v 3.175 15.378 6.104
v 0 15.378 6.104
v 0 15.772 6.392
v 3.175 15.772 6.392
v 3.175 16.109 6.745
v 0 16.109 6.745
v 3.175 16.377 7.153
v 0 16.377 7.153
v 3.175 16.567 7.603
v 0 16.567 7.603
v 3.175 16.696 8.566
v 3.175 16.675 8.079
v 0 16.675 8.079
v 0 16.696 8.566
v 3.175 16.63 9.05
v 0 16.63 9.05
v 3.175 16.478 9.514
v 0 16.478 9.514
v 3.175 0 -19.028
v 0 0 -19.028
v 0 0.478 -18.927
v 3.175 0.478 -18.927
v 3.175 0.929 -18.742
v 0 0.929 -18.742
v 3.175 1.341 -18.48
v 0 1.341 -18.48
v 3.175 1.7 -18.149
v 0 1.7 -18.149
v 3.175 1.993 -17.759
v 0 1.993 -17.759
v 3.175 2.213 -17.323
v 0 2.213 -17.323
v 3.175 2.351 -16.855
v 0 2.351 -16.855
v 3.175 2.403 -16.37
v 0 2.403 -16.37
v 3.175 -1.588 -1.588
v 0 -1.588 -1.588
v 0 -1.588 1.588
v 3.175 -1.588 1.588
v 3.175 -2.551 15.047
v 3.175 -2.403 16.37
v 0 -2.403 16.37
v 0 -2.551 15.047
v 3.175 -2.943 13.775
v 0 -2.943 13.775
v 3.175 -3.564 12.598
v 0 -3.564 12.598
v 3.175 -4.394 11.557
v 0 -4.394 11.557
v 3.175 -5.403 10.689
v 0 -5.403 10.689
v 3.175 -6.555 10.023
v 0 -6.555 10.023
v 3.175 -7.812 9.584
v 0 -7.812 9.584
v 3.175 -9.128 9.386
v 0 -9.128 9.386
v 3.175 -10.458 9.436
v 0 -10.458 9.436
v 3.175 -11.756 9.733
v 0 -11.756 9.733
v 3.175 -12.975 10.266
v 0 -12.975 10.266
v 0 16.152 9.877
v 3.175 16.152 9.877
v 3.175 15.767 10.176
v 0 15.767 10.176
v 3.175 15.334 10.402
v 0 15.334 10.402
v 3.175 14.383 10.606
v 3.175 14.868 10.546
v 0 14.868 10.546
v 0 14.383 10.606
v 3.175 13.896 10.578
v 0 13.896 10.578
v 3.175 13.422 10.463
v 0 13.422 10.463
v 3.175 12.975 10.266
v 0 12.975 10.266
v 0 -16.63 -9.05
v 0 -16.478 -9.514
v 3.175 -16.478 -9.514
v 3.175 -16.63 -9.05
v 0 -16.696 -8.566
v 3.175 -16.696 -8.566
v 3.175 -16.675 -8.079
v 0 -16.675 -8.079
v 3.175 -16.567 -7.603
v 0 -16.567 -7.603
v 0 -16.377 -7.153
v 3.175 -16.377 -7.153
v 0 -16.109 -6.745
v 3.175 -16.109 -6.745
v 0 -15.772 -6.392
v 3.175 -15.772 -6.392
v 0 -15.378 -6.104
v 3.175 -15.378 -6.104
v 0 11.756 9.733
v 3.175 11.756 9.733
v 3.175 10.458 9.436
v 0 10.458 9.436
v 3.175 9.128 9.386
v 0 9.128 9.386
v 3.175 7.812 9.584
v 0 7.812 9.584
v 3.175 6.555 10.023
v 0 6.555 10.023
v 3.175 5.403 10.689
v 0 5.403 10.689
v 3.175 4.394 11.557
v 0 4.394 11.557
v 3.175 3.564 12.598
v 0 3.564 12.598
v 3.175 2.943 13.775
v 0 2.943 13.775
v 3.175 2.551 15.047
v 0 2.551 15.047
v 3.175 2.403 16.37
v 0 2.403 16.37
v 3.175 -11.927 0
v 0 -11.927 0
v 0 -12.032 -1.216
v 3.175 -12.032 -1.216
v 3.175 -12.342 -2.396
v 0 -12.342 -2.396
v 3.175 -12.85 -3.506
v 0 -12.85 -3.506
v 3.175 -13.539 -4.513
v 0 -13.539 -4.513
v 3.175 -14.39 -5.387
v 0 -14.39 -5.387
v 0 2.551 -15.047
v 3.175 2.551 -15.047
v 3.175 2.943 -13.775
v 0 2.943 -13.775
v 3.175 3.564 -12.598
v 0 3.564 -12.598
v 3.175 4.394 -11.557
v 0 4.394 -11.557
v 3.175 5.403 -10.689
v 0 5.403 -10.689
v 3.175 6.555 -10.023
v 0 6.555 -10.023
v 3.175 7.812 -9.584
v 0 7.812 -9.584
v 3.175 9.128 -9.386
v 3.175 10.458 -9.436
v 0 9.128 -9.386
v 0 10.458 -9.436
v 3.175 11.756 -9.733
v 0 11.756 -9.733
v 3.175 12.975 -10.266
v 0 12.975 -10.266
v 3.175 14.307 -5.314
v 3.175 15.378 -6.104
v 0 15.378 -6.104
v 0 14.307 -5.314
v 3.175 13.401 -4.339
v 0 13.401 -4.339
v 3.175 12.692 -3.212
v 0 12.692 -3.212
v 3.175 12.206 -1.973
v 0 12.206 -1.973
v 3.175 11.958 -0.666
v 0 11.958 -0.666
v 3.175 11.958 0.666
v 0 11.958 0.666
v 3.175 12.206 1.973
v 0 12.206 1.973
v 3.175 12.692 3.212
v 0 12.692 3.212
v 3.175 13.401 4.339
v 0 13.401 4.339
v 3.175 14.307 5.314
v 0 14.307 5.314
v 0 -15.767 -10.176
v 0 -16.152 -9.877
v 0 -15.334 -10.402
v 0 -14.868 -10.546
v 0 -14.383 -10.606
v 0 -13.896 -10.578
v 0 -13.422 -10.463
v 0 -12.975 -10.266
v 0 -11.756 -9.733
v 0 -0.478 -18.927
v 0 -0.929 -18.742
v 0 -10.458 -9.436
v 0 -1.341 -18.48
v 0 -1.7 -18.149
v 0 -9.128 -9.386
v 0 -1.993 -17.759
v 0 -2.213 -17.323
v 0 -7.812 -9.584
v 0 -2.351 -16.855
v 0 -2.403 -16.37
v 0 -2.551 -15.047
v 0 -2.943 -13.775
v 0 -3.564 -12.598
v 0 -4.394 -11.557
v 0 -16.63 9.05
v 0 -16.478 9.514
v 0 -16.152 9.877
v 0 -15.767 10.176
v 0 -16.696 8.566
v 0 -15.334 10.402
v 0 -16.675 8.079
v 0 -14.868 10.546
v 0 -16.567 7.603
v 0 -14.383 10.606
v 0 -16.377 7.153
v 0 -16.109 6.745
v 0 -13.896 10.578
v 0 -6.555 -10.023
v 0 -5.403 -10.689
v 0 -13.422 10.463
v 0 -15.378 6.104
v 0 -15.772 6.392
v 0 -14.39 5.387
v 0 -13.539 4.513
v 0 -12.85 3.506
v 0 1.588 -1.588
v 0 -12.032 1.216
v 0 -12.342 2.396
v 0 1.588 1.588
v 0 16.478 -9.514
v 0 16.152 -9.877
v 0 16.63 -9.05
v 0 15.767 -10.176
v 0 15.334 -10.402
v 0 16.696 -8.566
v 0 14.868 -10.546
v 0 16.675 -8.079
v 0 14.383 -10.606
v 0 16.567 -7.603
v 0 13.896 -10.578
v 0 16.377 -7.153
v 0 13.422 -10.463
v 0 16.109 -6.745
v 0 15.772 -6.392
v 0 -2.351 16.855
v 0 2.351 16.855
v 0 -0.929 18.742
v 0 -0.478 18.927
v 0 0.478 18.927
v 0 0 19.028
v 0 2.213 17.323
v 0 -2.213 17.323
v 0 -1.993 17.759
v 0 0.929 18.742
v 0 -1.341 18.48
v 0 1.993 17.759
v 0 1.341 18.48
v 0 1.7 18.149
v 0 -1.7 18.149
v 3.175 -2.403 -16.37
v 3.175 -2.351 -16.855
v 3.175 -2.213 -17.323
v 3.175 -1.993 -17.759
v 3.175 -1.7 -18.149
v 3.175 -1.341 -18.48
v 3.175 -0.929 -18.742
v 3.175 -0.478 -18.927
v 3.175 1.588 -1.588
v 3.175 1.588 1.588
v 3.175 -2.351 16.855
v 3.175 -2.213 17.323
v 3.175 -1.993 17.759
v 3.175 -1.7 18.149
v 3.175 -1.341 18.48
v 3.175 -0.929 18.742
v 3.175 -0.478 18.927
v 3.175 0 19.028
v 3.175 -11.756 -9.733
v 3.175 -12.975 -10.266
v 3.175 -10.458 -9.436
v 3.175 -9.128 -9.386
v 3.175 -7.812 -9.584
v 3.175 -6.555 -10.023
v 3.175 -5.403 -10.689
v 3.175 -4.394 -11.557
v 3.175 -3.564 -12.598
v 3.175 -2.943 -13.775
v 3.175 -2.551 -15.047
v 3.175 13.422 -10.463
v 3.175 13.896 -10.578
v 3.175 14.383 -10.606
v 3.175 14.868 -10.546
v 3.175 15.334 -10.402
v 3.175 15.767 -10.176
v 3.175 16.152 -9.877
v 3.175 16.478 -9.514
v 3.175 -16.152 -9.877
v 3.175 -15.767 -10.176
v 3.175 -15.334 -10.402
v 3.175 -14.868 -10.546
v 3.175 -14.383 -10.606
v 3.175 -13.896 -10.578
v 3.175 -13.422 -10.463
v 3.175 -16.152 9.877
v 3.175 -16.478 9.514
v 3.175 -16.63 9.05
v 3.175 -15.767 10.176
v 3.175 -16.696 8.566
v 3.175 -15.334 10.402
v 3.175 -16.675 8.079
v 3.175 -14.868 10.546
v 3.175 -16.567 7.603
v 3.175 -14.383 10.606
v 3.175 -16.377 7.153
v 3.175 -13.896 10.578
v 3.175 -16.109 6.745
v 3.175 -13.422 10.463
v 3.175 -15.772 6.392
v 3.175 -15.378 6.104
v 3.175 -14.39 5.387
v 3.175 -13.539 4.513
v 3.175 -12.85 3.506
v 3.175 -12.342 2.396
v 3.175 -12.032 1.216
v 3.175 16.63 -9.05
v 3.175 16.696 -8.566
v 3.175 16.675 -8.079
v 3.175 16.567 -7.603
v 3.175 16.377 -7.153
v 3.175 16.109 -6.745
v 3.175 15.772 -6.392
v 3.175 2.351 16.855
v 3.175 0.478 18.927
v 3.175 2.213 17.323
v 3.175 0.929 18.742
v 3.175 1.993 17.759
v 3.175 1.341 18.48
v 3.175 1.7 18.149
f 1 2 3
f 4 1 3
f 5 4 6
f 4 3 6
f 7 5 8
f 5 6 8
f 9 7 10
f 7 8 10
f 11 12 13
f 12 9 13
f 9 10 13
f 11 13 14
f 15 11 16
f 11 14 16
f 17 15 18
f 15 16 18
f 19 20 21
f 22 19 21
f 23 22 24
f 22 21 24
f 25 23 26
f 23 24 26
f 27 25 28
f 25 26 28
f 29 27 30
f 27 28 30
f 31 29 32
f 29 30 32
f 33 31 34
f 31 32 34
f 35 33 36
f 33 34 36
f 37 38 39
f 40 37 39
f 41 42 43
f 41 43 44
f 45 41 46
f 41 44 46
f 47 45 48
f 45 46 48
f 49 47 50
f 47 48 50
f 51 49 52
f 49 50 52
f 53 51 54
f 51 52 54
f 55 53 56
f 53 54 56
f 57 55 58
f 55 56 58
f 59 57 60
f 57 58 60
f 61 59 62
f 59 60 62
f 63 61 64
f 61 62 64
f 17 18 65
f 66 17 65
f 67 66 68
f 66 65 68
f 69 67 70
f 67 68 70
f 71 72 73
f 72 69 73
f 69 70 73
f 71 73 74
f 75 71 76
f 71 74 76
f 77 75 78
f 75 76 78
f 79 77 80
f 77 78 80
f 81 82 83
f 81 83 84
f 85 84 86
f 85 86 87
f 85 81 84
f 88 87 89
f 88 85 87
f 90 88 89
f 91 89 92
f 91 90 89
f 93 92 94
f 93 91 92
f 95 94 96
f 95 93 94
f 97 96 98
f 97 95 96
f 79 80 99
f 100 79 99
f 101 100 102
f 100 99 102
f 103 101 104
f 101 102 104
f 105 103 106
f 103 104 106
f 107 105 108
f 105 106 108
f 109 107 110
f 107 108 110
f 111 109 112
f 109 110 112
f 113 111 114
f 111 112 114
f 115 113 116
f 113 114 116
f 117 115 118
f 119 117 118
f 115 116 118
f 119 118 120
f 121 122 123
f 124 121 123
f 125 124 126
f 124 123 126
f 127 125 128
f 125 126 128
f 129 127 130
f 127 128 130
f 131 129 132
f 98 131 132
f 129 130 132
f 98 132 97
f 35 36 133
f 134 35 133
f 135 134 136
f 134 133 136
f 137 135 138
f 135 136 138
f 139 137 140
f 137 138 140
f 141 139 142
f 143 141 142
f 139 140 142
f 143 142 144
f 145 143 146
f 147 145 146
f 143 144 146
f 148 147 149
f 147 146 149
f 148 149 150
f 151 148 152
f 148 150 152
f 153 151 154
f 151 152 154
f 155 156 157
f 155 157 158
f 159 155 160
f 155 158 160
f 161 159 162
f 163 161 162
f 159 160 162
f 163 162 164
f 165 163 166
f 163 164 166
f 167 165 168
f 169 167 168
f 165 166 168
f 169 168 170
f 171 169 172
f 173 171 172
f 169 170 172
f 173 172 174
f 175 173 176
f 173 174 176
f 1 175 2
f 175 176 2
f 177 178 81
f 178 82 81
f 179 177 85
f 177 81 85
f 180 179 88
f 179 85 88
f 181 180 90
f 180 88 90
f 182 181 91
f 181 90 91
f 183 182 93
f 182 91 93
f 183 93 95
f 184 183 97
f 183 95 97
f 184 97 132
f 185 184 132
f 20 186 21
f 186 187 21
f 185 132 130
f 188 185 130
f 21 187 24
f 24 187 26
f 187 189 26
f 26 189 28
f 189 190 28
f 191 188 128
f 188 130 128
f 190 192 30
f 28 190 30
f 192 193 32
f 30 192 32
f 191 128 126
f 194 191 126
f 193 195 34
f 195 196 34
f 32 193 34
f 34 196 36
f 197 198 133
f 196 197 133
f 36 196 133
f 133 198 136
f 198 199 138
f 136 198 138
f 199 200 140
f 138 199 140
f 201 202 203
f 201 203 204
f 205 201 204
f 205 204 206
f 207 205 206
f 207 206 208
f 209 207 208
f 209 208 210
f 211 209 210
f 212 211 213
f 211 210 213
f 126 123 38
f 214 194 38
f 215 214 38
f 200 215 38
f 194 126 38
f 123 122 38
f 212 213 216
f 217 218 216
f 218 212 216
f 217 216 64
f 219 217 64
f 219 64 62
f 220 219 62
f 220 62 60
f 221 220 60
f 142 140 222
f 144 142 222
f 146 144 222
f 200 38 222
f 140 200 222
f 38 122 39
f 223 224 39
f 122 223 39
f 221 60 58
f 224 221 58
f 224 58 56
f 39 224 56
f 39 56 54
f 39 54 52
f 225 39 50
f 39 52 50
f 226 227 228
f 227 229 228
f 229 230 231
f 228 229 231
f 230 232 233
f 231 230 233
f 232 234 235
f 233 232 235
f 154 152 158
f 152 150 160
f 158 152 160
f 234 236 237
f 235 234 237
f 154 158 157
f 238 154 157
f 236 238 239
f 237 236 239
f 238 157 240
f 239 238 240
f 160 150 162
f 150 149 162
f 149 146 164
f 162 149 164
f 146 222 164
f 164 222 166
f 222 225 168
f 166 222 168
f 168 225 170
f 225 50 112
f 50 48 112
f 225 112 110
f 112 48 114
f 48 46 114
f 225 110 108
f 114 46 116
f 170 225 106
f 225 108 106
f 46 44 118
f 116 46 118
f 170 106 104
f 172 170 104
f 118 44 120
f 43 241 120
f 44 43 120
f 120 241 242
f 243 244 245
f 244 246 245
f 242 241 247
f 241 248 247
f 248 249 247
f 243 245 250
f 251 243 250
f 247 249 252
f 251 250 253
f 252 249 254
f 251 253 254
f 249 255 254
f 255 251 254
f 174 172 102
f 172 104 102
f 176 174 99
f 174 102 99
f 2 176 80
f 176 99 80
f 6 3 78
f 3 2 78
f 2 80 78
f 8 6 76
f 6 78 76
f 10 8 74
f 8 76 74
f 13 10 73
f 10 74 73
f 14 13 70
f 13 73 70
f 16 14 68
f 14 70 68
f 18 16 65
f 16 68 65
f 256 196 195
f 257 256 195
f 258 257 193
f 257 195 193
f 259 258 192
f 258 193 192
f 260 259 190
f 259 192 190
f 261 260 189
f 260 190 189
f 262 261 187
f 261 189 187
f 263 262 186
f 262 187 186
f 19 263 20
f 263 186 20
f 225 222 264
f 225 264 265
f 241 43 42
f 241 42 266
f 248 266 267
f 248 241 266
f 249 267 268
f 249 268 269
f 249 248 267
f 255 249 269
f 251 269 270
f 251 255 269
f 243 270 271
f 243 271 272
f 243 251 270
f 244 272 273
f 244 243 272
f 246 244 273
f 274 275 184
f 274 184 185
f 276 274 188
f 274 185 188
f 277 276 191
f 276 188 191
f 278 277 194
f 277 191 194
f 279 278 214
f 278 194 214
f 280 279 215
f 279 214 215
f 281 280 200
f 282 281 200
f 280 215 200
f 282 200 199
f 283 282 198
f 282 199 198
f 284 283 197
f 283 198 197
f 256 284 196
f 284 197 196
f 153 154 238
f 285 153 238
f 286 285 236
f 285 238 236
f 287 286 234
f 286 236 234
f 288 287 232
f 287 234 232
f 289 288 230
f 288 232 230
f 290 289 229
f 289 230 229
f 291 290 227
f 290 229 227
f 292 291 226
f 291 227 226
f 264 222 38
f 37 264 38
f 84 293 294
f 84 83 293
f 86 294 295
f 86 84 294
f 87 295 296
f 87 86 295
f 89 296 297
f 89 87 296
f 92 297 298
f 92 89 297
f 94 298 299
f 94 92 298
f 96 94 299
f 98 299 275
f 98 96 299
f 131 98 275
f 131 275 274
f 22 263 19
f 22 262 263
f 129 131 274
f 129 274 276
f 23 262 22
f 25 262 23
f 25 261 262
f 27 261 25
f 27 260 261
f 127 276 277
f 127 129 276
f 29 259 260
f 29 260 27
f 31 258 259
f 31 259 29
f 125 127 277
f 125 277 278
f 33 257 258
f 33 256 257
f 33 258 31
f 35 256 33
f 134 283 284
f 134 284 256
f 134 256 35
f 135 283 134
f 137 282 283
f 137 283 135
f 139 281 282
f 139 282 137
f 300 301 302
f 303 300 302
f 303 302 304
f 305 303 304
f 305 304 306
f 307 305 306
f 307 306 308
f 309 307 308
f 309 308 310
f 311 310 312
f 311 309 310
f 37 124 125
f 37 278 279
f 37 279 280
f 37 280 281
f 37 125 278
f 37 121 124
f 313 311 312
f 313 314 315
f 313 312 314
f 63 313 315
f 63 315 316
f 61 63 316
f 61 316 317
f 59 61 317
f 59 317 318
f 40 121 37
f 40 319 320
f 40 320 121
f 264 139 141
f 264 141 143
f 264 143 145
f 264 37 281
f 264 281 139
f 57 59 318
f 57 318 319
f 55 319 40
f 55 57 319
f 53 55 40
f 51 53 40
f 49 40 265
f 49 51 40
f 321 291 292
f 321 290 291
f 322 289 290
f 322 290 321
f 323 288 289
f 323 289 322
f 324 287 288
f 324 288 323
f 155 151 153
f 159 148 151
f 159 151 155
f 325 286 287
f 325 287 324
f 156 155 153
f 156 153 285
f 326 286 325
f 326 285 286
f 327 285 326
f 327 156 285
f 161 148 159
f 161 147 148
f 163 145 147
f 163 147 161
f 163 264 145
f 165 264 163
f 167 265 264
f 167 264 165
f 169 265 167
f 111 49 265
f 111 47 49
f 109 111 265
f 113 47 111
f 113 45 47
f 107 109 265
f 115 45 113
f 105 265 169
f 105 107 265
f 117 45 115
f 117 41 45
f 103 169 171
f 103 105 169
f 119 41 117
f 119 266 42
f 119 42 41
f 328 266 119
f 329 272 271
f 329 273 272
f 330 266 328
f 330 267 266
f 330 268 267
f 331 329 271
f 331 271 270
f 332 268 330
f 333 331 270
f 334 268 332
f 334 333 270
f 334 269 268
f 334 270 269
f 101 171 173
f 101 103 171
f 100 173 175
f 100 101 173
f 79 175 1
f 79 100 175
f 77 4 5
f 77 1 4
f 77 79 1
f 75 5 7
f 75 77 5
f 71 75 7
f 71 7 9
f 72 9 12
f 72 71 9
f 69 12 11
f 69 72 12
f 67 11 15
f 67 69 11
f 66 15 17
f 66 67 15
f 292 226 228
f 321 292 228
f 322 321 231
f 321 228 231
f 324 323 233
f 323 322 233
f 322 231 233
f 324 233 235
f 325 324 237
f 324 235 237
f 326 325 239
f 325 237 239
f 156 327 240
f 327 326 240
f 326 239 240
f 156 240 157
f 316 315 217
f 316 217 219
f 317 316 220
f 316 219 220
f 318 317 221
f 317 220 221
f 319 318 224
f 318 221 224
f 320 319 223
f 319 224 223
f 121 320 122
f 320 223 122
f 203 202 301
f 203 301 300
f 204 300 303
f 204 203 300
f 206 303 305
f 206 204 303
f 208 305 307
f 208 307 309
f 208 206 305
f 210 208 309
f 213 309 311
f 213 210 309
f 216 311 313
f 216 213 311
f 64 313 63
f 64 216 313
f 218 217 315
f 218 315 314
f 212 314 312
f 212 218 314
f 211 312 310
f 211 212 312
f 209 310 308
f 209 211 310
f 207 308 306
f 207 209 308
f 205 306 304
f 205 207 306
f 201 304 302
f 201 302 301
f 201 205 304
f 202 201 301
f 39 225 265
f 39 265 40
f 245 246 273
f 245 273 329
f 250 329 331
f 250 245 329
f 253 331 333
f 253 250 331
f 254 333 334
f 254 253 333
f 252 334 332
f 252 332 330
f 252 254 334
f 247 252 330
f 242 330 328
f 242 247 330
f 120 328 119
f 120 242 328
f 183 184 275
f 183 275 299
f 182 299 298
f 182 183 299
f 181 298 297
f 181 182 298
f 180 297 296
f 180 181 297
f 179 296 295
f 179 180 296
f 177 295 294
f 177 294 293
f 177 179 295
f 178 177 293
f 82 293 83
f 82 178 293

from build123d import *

# Parameters (mm, degrees)
F1_DEPTH    = 3.175
F2_W        = 3.175
F2_H        = 3.175
F3_DEPTH    = 25.4
F4_T1_DEPTH = 19.0841031127


# Not quite as in the source:
# - a fillet or chamfer that OpenCascade refuses, or shapes differently, is made with other operations: its cross-section is extruded or revolved along the edge and cut away or added


with BuildPart() as f1:
    # F0 (on Right) → F1 (new body)
    with BuildSketch(Plane.YZ):
        with BuildLine():
            ThreePointArc((17.7183197491, -6.9974027515), (11.9270078227, 0), (17.7183197491, 6.9974027515))
            ThreePointArc((17.7183197491, 6.9974027515), (16.4977839421, 9.525), (14.9190884179, 11.8458136394))
            ThreePointArc((14.9190884179, 11.8458136394), (5.9635039114, 10.3290917656), (2.7992313312, 18.8432163909))
            ThreePointArc((2.7992313312, 18.8432163909), (0, 19.05), (-2.7992313312, 18.8432163909))
            ThreePointArc((-2.7992313312, 18.8432163909), (-2.5020157635, 17.6871997533), (-2.4020078227, 16.4977839421))
            ThreePointArc((-2.4020078227, 16.4977839421), (-7.0435721899, 9.8209932773), (-14.9190884179, 11.8458136394))
            ThreePointArc((-14.9190884179, 11.8458136394), (-16.4977839421, 9.525), (-17.7183197491, 6.9974027515))
            ThreePointArc((-17.7183197491, 6.9974027515), (-13.5626251464, 4.5415564264), (-11.9270078227, 0))
            ThreePointArc((-11.9270078227, 0), (-13.5626251464, -4.5415564264), (-17.7183197491, -6.9974027515))
            ThreePointArc((-17.7183197491, -6.9974027515), (-16.4977839421, -9.525), (-14.9190884179, -11.8458136394))
            ThreePointArc((-14.9190884179, -11.8458136394), (-7.0435721899, -9.8209932773), (-2.4020078227, -16.4977839421))
            ThreePointArc((-2.4020078227, -16.4977839421), (-2.5020157635, -17.6871997533), (-2.7992313312, -18.8432163909))
            ThreePointArc((-2.7992313312, -18.8432163909), (0, -19.05), (2.7992313312, -18.8432163909))
            ThreePointArc((2.7992313312, -18.8432163909), (5.9635039114, -10.3290917656), (14.9190884179, -11.8458136394))
            ThreePointArc((14.9190884179, -11.8458136394), (16.4977839421, -9.525), (17.7183197491, -6.9974027515))
        make_face()
    extrude(amount=F1_DEPTH)

    # F2 (on face) → F3 (cut)
    with BuildSketch(Plane(origin=(0, 0, 0), x_dir=(0, -1, 0), z_dir=(-1, 0, 0))):
        Rectangle(F2_W, F2_H)
    extrude(amount=-F3_DEPTH, mode=Mode.SUBTRACT)

    # F4: fillet of radius 2.7258813335 on 12 edges, made by hand

    # F4_s2 → F4_t1 (cut)
    with BuildSketch(Plane.YZ.offset(-7.9545515563)):
        with BuildLine():
            ThreePointArc((-16.6826195947, 9.1974291766), (-15.0505041811, 10.5005937812), (-12.9751564545, 10.2661358457))
            ThreePointArc((-12.9751564545, 10.2661358457), (-14.0171055557, 10.9698543809), (-14.9190884179, 11.8458136394))
            ThreePointArc((-14.9190884179, 11.8458136394), (-15.8562439561, 10.5585049892), (-16.6826195947, 9.1974291766))
        make_face()
        with BuildLine():
            ThreePointArc((-15.3783126684, 6.1037471848), (-16.6190330599, 7.78382207), (-16.3065171138, 9.8488577824))
            ThreePointArc((-16.3065171138, 9.8488577824), (-17.0720555246, 8.45265758), (-17.7183197491, 6.9974027515))
            ThreePointArc((-17.7183197491, 6.9974027515), (-16.5087253475, 6.6542423084), (-15.3783126684, 6.1037471848))
        make_face()
        with BuildLine():
            ThreePointArc((-16.3065171138, -9.8488577824), (-16.6190330599, -7.78382207), (-15.3783126684, -6.1037471848))
            ThreePointArc((-15.3783126684, -6.1037471848), (-16.5087253475, -6.6542423084), (-17.7183197491, -6.9974027515))
            ThreePointArc((-17.7183197491, -6.9974027515), (-17.0720555246, -8.45265758), (-16.3065171138, -9.8488577824))
        make_face()
        with BuildLine():
            ThreePointArc((-12.9751564545, -10.2661358457), (-15.0505041811, -10.5005937812), (-16.6826195947, -9.1974291766))
            ThreePointArc((-16.6826195947, -9.1974291766), (-15.8562439561, -10.5585049892), (-14.9190884179, -11.8458136394))
            ThreePointArc((-14.9190884179, -11.8458136394), (-14.0171055557, -10.9698543809), (-12.9751564545, -10.2661358457))
        make_face()
        with BuildLine():
            ThreePointArc((-2.4031562138, -16.3698830306), (-1.5685288788, -18.2844158512), (0.3761024809, -19.046286959))
            ThreePointArc((0.3761024809, -19.046286959), (-1.2158115686, -19.0111625691), (-2.7992313312, -18.8432163909))
            ThreePointArc((-2.7992313312, -18.8432163909), (-2.4916197918, -17.6240966892), (-2.4031562138, -16.3698830306))
        make_face()
        with BuildLine():
            ThreePointArc((-2.4031562138, 16.3698830306), (-1.5685288788, 18.2844158512), (0.3761024809, 19.046286959))
            ThreePointArc((0.3761024809, 19.046286959), (-1.2158115686, 19.0111625691), (-2.7992313312, 18.8432163909))
            ThreePointArc((-2.7992313312, 18.8432163909), (-2.4916197918, 17.6240966892), (-2.4031562138, 16.3698830306))
        make_face()
        with BuildLine():
            ThreePointArc((16.6826195947, 9.1974291766), (15.0505041811, 10.5005937812), (12.9751564545, 10.2661358457))
            ThreePointArc((12.9751564545, 10.2661358457), (14.0171055557, 10.9698543809), (14.9190884179, 11.8458136394))
            ThreePointArc((14.9190884179, 11.8458136394), (15.8562439561, 10.5585049892), (16.6826195947, 9.1974291766))
        make_face()
        with BuildLine():
            ThreePointArc((-0.3761024809, 19.046286959), (1.5685288788, 18.2844158512), (2.4031562138, 16.3698830306))
            ThreePointArc((2.4031562138, 16.3698830306), (2.4916197918, 17.6240966892), (2.7992313312, 18.8432163909))
            ThreePointArc((2.7992313312, 18.8432163909), (1.2158115686, 19.0111625691), (-0.3761024809, 19.046286959))
        make_face()
        with BuildLine():
            ThreePointArc((15.3783126684, 6.1037471848), (16.6190330599, 7.78382207), (16.3065171138, 9.8488577824))
            ThreePointArc((16.3065171138, 9.8488577824), (17.0720555246, 8.45265758), (17.7183197491, 6.9974027515))
            ThreePointArc((17.7183197491, 6.9974027515), (16.5087253475, 6.6542423084), (15.3783126684, 6.1037471848))
        make_face()
        with BuildLine():
            ThreePointArc((16.3065171138, -9.8488577824), (16.6190330599, -7.78382207), (15.3783126684, -6.1037471848))
            ThreePointArc((15.3783126684, -6.1037471848), (16.5087253475, -6.6542423084), (17.7183197491, -6.9974027515))
            ThreePointArc((17.7183197491, -6.9974027515), (17.0720555246, -8.45265758), (16.3065171138, -9.8488577824))
        make_face()
        with BuildLine():
            ThreePointArc((12.9751564545, -10.2661358457), (15.0505041811, -10.5005937812), (16.6826195947, -9.1974291766))
            ThreePointArc((16.6826195947, -9.1974291766), (15.8562439561, -10.5585049892), (14.9190884179, -11.8458136394))
            ThreePointArc((14.9190884179, -11.8458136394), (14.0171055557, -10.9698543809), (12.9751564545, -10.2661358457))
        make_face()
        with BuildLine():
            ThreePointArc((-0.3761024809, -19.046286959), (1.5685288788, -18.2844158512), (2.4031562138, -16.3698830306))
            ThreePointArc((2.4031562138, -16.3698830306), (2.4916197918, -17.6240966892), (2.7992313312, -18.8432163909))
            ThreePointArc((2.7992313312, -18.8432163909), (1.2158115686, -19.0111625691), (-0.3761024809, -19.046286959))
        make_face()
    extrude(amount=F4_T1_DEPTH, mode=Mode.SUBTRACT)


solid = f1.part
